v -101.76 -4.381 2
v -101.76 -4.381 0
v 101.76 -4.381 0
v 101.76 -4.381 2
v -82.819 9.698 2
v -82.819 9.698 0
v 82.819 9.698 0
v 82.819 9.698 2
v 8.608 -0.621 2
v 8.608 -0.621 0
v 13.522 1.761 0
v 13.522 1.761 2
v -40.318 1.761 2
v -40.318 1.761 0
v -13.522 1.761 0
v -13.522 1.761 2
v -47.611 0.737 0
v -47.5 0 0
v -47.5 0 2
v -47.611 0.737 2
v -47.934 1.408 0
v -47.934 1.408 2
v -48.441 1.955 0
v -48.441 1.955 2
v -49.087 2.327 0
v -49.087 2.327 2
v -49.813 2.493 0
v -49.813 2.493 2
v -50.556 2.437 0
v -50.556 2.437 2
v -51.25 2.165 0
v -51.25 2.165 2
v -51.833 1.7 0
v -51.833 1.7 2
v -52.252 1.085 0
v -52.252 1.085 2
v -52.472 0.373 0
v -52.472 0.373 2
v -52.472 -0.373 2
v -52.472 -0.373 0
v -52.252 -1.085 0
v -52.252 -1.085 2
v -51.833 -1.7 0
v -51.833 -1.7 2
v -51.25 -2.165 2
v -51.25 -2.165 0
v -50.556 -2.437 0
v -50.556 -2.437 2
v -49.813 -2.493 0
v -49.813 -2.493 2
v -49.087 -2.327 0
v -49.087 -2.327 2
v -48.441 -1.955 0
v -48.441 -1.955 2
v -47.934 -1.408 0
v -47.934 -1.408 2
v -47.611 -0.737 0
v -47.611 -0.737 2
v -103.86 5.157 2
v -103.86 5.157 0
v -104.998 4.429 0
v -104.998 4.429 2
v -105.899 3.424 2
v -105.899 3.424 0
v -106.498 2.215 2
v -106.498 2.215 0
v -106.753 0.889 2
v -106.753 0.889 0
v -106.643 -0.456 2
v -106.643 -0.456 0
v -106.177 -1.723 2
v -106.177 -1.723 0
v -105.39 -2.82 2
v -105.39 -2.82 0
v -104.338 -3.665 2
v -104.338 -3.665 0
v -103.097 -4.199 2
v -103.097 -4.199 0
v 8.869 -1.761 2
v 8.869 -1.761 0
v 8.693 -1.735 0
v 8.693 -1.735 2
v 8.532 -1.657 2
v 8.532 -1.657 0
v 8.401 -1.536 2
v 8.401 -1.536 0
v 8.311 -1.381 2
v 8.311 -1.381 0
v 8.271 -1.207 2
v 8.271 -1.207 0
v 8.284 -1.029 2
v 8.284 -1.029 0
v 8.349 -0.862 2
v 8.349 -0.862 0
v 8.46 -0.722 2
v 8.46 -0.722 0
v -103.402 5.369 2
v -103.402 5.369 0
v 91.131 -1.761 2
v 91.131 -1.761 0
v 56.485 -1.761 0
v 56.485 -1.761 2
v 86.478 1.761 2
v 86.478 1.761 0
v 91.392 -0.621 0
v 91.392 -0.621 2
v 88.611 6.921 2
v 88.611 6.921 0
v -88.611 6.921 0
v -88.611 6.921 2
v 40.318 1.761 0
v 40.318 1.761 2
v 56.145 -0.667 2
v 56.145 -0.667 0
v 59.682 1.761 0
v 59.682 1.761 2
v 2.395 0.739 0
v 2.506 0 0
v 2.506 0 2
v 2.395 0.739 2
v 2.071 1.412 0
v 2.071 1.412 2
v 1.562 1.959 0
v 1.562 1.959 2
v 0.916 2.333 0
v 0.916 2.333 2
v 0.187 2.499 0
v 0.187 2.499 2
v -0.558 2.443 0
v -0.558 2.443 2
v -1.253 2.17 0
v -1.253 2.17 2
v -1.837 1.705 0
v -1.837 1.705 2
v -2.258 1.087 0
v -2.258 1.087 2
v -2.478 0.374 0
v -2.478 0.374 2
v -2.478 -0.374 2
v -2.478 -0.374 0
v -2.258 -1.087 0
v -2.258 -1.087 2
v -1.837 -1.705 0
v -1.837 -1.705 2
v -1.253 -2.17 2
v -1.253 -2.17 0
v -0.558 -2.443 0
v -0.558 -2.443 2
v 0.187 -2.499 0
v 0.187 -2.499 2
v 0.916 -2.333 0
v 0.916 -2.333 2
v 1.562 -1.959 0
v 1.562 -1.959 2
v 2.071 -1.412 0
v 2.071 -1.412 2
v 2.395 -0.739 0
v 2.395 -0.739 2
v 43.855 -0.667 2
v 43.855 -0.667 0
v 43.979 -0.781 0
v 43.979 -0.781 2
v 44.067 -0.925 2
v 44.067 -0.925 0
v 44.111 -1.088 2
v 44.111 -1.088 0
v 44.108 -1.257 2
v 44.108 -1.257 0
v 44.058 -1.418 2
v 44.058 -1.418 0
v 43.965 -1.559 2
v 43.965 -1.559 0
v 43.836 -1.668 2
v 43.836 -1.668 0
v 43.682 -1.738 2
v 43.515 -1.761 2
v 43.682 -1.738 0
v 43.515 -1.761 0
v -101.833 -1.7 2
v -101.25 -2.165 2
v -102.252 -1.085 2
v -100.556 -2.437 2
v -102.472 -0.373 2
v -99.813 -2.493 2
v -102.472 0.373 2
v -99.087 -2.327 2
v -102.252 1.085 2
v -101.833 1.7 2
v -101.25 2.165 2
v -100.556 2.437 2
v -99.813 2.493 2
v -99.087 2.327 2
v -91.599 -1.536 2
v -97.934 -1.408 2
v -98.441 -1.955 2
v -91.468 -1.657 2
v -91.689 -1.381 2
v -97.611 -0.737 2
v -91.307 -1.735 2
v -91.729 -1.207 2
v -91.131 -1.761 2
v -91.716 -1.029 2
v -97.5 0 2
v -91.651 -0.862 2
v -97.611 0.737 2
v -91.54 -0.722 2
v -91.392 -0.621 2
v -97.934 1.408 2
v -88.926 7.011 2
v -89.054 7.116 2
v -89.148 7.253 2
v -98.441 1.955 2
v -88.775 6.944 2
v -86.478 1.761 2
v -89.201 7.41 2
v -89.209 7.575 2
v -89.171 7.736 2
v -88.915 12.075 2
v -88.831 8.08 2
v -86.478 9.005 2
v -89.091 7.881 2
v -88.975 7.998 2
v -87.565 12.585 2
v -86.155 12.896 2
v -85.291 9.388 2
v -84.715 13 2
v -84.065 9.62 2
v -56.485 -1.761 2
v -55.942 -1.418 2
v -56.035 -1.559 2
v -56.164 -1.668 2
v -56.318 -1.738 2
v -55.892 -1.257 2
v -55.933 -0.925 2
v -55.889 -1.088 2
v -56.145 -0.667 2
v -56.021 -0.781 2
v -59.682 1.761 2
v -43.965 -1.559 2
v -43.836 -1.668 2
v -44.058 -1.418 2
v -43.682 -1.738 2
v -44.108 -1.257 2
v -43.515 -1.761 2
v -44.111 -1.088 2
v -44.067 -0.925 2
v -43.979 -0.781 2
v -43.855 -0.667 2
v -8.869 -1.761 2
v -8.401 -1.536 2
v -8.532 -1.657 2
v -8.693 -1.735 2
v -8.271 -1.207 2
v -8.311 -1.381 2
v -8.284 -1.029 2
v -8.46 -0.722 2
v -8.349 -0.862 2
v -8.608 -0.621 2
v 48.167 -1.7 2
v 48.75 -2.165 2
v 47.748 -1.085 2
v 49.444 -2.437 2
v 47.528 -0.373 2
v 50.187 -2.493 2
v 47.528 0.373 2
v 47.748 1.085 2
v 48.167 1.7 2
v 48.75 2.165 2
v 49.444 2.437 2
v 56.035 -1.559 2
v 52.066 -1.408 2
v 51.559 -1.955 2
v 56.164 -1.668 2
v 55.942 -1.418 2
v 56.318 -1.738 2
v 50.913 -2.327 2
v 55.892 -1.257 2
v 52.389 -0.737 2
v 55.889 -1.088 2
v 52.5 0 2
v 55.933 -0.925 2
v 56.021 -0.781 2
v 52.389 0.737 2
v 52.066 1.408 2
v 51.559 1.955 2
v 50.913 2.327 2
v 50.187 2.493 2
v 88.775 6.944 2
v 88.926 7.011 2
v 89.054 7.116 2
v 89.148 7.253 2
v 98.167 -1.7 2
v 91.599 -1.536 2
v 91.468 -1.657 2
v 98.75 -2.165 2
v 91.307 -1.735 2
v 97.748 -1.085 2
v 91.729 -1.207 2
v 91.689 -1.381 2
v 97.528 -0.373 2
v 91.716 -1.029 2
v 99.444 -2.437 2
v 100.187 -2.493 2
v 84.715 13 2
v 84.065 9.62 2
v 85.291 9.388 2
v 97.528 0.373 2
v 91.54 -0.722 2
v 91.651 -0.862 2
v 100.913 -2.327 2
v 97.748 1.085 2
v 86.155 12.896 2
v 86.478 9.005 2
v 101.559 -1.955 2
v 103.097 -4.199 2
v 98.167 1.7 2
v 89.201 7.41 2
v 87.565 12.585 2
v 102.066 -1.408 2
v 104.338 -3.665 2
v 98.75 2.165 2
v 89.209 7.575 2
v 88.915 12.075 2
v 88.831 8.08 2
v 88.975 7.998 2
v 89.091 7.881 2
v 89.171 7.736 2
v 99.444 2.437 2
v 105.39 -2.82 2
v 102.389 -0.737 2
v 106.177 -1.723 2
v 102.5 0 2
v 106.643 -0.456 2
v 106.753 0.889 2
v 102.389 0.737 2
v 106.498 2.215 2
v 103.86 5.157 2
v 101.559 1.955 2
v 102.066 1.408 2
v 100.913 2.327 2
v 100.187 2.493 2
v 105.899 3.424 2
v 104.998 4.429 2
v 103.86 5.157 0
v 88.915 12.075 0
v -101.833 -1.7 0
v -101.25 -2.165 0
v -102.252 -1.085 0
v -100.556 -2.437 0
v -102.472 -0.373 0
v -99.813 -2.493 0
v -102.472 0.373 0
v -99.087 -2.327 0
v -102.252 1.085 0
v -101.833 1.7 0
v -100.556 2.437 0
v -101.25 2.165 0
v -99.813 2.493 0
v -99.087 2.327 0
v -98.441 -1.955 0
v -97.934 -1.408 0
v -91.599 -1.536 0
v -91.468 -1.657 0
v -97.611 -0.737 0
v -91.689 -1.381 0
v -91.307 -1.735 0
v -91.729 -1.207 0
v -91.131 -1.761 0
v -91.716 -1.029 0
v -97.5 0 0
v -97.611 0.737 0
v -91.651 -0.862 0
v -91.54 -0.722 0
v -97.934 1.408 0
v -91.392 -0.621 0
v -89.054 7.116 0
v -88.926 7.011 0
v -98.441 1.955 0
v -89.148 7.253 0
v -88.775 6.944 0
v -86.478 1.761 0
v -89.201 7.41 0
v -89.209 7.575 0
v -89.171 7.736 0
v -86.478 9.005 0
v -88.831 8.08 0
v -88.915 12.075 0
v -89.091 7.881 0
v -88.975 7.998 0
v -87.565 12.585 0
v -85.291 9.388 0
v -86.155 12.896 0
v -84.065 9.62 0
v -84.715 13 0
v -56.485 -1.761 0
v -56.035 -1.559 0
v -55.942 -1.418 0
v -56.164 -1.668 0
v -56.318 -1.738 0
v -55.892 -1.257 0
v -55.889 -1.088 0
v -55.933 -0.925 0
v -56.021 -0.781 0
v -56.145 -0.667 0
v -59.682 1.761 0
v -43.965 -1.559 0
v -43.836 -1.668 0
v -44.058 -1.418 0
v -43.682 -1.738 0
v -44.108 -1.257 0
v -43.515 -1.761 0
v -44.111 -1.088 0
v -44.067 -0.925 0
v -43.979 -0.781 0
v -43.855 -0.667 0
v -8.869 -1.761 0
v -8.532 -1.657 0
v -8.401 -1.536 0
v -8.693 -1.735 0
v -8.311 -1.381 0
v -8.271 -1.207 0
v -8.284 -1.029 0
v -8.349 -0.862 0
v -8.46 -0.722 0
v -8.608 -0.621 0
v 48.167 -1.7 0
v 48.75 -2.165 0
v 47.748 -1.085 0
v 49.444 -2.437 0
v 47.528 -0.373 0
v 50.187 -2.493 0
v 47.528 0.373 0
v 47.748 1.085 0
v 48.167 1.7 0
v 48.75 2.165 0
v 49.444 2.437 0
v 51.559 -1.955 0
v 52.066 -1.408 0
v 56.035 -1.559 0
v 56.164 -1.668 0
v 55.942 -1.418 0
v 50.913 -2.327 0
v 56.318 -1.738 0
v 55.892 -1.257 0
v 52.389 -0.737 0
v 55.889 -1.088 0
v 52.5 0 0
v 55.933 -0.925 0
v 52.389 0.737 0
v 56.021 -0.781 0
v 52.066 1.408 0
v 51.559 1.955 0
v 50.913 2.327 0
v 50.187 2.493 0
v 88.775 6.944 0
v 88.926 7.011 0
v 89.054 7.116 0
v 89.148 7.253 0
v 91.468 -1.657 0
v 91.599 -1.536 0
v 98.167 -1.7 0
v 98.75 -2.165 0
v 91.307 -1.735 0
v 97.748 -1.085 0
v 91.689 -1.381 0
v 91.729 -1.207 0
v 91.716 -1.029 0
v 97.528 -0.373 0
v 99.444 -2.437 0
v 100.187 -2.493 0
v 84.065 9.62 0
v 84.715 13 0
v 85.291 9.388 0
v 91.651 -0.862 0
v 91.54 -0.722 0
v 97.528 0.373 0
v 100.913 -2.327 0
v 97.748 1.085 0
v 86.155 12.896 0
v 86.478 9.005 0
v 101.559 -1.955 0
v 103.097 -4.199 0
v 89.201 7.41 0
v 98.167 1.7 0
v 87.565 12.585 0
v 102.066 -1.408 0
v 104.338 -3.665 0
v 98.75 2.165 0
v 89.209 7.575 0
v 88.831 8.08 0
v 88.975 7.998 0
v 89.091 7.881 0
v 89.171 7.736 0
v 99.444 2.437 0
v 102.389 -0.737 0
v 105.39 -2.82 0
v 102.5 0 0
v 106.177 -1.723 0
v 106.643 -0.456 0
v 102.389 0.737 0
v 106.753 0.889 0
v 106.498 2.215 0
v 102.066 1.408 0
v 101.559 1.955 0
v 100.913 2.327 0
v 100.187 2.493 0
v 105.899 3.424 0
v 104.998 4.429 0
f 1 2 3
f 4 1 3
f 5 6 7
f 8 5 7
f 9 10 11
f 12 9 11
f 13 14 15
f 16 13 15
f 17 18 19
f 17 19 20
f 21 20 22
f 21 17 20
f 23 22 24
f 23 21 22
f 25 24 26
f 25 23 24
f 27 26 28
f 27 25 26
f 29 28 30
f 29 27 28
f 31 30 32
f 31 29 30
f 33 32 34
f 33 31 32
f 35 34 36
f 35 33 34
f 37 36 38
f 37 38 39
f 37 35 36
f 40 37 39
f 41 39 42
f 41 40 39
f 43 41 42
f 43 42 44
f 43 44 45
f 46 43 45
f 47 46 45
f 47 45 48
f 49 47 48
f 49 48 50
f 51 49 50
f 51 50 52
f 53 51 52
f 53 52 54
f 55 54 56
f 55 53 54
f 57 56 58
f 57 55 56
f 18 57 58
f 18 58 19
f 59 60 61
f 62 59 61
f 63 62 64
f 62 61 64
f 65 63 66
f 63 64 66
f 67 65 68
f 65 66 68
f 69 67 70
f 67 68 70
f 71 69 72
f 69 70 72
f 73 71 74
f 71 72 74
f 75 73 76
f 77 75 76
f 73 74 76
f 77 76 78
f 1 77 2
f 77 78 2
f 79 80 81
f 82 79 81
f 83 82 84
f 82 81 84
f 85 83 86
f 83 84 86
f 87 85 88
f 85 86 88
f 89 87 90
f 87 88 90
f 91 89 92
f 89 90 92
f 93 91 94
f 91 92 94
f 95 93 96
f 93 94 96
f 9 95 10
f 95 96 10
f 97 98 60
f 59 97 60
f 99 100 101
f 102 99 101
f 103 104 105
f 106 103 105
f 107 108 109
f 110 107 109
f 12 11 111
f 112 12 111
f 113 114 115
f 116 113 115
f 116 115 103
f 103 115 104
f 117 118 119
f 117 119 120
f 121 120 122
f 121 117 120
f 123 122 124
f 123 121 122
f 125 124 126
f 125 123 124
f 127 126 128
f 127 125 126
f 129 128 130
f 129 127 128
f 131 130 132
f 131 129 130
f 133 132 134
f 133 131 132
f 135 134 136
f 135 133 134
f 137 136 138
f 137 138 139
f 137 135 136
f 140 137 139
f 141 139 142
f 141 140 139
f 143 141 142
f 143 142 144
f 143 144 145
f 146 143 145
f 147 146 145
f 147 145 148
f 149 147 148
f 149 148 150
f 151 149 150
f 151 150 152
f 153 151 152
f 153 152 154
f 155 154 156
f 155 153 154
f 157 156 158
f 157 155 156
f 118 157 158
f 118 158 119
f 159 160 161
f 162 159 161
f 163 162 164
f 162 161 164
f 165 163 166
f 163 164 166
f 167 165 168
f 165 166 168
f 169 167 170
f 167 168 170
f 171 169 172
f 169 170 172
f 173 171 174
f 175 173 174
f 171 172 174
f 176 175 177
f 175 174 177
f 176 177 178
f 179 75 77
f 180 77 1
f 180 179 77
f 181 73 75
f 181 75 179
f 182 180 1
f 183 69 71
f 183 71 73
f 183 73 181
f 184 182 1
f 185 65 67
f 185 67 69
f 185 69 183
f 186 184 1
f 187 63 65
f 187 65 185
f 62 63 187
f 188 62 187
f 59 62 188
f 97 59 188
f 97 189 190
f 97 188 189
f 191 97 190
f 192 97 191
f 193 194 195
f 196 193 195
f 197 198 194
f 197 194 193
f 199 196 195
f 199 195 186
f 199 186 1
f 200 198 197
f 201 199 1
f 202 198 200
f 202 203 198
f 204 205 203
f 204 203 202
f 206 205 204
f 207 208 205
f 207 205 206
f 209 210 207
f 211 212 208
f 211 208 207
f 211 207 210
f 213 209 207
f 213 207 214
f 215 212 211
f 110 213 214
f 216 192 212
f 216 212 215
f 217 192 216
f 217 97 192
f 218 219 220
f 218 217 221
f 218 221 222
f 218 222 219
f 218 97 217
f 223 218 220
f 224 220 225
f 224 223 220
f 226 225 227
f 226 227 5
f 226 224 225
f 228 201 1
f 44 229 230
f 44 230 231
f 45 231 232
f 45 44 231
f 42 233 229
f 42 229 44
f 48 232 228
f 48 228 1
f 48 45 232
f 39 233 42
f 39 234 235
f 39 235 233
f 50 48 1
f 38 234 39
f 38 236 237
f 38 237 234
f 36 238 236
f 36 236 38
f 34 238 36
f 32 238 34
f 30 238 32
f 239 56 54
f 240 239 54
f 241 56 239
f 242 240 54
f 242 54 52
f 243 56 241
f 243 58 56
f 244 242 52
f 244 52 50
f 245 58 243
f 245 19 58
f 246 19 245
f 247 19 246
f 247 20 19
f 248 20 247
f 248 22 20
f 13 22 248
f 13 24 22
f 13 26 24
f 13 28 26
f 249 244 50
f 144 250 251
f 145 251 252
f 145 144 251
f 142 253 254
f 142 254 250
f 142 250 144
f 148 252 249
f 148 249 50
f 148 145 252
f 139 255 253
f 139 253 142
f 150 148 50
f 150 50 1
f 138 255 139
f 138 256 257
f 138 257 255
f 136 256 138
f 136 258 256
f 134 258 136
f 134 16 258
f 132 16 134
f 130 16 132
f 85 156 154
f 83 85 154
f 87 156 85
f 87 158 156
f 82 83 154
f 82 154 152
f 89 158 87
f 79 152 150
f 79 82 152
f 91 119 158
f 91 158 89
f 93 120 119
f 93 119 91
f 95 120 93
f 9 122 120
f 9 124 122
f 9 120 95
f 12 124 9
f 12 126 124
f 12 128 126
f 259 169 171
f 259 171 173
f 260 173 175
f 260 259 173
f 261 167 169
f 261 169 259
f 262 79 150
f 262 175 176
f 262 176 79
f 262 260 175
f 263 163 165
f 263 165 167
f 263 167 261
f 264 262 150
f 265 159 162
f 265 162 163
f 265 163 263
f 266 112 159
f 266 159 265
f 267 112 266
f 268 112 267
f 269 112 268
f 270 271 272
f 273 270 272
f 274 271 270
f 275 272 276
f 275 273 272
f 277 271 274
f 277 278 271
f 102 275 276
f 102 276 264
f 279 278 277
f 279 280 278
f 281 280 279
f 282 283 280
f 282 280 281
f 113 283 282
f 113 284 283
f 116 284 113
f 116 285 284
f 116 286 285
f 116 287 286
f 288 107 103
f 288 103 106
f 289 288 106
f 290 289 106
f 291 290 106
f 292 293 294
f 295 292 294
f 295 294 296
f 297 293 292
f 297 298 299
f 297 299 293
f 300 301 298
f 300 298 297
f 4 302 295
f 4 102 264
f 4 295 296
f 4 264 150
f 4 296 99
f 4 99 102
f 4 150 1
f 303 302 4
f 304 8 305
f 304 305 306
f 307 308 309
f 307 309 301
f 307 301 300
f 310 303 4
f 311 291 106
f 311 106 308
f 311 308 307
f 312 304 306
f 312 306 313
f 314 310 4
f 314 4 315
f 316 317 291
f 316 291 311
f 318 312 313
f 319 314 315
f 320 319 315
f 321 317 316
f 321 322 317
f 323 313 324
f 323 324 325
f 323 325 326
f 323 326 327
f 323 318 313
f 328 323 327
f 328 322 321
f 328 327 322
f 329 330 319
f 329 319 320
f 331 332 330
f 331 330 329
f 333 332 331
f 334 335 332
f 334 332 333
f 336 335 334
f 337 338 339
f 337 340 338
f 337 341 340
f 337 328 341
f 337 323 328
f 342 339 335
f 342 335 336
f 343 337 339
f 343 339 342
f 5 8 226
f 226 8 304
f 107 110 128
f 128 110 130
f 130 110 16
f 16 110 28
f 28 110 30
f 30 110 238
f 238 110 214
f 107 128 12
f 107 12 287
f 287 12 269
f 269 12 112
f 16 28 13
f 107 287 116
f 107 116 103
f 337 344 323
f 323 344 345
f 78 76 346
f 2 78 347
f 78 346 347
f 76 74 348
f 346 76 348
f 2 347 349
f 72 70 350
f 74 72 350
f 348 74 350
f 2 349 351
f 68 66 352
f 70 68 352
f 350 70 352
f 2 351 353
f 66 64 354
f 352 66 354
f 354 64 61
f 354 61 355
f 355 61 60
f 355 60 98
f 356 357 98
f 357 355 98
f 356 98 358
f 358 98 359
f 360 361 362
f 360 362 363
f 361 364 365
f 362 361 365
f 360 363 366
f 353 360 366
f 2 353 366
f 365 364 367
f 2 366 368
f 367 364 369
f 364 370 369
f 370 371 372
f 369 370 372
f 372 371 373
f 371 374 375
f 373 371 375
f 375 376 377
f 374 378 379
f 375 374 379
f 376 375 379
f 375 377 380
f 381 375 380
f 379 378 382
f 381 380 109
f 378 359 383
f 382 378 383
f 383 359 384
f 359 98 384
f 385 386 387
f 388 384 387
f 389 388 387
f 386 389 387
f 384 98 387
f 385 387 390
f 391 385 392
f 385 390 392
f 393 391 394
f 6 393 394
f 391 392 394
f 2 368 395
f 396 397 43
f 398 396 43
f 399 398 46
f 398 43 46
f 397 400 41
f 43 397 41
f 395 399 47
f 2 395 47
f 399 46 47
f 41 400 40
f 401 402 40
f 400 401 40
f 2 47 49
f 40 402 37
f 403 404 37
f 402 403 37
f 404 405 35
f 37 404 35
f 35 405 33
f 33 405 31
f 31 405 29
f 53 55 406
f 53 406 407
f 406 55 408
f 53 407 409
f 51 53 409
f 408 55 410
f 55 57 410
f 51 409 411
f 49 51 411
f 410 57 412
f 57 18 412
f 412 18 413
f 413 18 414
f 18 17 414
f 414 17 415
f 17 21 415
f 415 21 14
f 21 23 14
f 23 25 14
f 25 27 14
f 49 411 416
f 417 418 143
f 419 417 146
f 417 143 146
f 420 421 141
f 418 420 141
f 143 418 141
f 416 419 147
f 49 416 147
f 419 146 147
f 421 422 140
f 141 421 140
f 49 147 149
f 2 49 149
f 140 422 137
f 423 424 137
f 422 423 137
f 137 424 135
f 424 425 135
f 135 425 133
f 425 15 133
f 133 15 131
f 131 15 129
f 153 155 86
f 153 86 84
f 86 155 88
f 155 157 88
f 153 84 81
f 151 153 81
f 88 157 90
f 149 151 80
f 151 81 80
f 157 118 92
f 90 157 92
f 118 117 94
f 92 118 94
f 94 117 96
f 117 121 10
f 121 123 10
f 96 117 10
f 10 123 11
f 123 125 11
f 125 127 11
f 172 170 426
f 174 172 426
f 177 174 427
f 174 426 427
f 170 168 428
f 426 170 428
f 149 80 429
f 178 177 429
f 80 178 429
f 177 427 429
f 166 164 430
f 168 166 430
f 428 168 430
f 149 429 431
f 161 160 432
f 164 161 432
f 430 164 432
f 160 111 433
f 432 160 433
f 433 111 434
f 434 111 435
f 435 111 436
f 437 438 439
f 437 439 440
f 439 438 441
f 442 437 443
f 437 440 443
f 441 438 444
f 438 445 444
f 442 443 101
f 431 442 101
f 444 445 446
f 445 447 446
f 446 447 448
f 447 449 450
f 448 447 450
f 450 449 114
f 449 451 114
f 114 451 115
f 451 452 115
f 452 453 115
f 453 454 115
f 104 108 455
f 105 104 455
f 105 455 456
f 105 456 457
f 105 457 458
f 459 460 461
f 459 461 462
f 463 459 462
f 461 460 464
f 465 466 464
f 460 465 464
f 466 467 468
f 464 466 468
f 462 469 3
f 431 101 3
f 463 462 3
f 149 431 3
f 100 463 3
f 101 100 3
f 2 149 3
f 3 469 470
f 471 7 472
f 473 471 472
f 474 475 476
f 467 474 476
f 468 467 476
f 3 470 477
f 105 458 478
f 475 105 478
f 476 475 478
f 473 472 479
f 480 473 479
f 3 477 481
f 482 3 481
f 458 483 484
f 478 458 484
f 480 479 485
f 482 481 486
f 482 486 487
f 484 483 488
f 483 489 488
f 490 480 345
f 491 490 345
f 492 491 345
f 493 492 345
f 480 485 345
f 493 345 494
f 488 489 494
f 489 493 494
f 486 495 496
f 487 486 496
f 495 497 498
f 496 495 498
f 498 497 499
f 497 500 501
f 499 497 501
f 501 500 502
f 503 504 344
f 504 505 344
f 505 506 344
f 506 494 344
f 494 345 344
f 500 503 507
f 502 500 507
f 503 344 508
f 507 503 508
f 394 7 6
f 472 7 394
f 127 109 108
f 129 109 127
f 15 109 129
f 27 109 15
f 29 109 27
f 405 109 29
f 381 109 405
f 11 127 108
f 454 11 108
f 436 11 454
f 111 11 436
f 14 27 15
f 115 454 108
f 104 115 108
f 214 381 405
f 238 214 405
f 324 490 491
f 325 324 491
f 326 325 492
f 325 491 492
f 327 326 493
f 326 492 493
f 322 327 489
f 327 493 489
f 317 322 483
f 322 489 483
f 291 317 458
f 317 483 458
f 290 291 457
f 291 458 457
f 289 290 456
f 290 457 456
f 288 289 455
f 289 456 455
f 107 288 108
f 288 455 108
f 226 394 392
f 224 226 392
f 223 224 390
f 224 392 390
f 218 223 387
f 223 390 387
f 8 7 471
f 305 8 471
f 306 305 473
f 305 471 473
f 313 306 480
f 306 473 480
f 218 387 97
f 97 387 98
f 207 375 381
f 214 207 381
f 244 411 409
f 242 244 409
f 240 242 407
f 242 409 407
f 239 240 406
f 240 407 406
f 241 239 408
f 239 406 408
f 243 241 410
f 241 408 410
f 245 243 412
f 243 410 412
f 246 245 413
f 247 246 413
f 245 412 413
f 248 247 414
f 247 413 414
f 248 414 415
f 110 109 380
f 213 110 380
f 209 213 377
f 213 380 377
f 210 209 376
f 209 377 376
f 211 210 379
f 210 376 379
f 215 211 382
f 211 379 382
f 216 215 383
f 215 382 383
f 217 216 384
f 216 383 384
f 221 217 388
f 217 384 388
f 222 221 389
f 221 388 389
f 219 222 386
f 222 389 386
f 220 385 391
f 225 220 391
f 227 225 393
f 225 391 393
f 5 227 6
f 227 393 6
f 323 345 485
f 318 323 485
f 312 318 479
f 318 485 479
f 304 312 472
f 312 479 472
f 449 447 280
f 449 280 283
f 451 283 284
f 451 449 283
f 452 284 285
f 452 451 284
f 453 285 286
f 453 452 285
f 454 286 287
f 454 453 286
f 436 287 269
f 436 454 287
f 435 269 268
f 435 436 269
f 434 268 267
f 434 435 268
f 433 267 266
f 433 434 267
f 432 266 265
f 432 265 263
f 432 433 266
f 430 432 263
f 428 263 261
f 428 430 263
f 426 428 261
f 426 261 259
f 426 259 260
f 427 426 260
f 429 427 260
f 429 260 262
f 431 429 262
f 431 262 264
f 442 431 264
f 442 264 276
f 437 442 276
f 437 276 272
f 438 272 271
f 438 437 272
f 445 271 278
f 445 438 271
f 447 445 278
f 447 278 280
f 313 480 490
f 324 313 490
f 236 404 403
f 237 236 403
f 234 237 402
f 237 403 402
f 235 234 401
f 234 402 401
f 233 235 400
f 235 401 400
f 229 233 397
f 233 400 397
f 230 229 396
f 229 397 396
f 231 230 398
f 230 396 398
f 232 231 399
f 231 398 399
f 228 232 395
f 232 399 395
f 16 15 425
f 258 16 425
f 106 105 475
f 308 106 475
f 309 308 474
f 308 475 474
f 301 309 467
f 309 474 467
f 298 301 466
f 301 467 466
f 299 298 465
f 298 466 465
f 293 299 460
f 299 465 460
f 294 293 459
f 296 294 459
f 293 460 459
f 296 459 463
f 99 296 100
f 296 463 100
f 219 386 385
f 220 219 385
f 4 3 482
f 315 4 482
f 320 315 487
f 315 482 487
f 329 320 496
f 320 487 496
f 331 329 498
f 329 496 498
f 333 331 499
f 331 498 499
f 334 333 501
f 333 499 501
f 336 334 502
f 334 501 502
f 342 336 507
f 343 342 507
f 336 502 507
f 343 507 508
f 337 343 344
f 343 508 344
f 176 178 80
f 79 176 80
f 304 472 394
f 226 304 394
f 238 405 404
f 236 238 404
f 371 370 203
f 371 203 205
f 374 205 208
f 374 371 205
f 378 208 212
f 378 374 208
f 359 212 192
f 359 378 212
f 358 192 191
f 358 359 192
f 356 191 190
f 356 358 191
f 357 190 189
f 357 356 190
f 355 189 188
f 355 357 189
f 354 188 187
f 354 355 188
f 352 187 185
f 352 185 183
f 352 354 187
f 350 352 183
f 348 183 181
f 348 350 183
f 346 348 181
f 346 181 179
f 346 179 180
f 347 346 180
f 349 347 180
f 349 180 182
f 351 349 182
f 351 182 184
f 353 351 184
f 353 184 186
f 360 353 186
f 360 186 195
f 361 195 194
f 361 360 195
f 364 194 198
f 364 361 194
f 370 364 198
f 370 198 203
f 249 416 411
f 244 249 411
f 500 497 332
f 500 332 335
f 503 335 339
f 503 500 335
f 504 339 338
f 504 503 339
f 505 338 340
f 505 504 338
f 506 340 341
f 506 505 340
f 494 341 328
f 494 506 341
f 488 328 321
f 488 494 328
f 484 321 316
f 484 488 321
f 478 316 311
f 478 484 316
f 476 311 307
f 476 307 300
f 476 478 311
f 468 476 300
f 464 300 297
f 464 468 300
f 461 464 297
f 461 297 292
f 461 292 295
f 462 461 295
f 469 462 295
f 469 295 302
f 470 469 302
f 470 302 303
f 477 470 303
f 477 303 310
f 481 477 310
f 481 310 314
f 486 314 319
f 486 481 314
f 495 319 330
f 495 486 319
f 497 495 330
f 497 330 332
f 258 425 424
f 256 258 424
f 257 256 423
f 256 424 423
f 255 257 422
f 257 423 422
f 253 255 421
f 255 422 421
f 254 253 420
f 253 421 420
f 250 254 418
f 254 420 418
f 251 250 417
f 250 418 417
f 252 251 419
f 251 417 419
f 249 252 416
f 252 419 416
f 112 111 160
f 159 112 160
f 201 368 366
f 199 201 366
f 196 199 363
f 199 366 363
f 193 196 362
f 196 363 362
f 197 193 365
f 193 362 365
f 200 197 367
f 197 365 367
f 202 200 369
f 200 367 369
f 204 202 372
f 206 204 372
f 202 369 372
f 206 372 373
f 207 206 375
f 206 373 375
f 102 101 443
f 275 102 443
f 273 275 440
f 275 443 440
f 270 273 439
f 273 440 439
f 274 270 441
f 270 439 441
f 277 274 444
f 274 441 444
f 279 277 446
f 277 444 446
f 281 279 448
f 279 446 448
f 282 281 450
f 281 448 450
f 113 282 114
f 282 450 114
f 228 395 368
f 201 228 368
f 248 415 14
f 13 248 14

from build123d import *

# Parameters (mm, degrees)
SKETCH1_R           = 2.5
SKETCH1_R_2         = 2.506016037
BOSS_EXTRUDE1_DEPTH = 2


with BuildPart() as part:
    # Sketch1 → Boss-Extrude1 (new body)
    with BuildSketch(Plane.XY):
        with BuildLine():
            Line((84.714565194, 13), (-84.714565194, 13))
            ThreePointArc((-84.714565194, 13), (-86.865323204, 12.765973581), (-88.915414375, 12.074847997))
            Line((-88.915414375, 12.074847997), (-103.401698361, 5.368984247))
            Line((-103.401698361, 5.368984247), (-103.860380263, 5.156655237))
            ThreePointArc((-103.860380263, 5.156655237), (-106.642942464, -0.456147767), (-101.759955673, -4.380768762))
            Line((-101.759955673, -4.380768762), (101.759955673, -4.380768762))
            ThreePointArc((101.759955673, -4.380768762), (106.642942464, -0.456147767), (103.860380263, 5.156655237))
            Line((103.860380263, 5.156655237), (88.915414375, 12.074847997))
            ThreePointArc((88.915414375, 12.074847997), (86.865323204, 12.765973581), (84.714565194, 13))
        make_face()
        with Locations((-100, 0)):
            Circle(SKETCH1_R, mode=Mode.SUBTRACT)
        with BuildLine():
            Line((-59.681677735, 1.761321711), (-56.14514104, -0.666672148))
            ThreePointArc((-56.14514104, -0.666672148), (-55.911681313, -1.339099386), (-56.484737706, -1.761317581))
            Line((-56.484737706, -1.761317581), (-91.130638371, -1.761317581))
            ThreePointArc((-91.130638371, -1.761317581), (-91.71541475, -1.295617942), (-91.392423967, -0.621439537))
            Line((-91.392423967, -0.621439537), (-86.478477199, 1.761321711))
            Line((-86.478477199, 1.761321711), (-59.681677735, 1.761321711))
        make_face(mode=Mode.SUBTRACT)
        with Locations((-50, 0)):
            Circle(SKETCH1_R, mode=Mode.SUBTRACT)
        with BuildLine():
            Line((-13.521523964, 1.761321711), (-8.607577196, -0.621439537))
            ThreePointArc((-8.607577196, -0.621439537), (-8.284586412, -1.295617942), (-8.869362791, -1.761317581))
            Line((-8.869362791, -1.761317581), (-43.515263456, -1.761317581))
            ThreePointArc((-43.515263456, -1.761317581), (-44.08831985, -1.339099386), (-43.854860123, -0.666672148))
            Line((-43.854860123, -0.666672148), (-40.318323427, 1.761321711))
            Line((-40.318323427, 1.761321711), (-13.521523964, 1.761321711))
        make_face(mode=Mode.SUBTRACT)
        Circle(SKETCH1_R_2, mode=Mode.SUBTRACT)
        with BuildLine():
            Line((40.318323427, 1.761321711), (43.854860123, -0.666672148))
            ThreePointArc((43.854860123, -0.666672148), (44.08831985, -1.339099386), (43.515263456, -1.761317581))
            Line((43.515263456, -1.761317581), (8.869362791, -1.761317581))
            ThreePointArc((8.869362791, -1.761317581), (8.284586412, -1.295617942), (8.607577196, -0.621439537))
            Line((8.607577196, -0.621439537), (13.521523964, 1.761321711))
            Line((13.521523964, 1.761321711), (40.318323427, 1.761321711))
        make_face(mode=Mode.SUBTRACT)
        with Locations((50.000000581, 2.065e-06)):
            Circle(SKETCH1_R, mode=Mode.SUBTRACT)
        with BuildLine():
            Line((86.478477199, 1.761321711), (91.392423967, -0.621439537))
            ThreePointArc((91.392423967, -0.621439537), (91.71541475, -1.295617942), (91.130638371, -1.761317581))
            Line((91.130638371, -1.761317581), (56.484737706, -1.761317581))
            ThreePointArc((56.484737706, -1.761317581), (55.911681313, -1.339099386), (56.14514104, -0.666672148))
            Line((56.14514104, -0.666672148), (59.681677735, 1.761321711))
            Line((59.681677735, 1.761321711), (86.478477199, 1.761321711))
        make_face(mode=Mode.SUBTRACT)
        with Locations((100, 0)):
            Circle(SKETCH1_R, mode=Mode.SUBTRACT)
        with BuildLine():
            ThreePointArc((-86.478477199, 9.004514969), (-84.681411012, 9.523161606), (-82.81919634, 9.698083666))
            Line((-82.81919634, 9.698083666), (82.81919634, 9.698083666))
            ThreePointArc((82.81919634, 9.698083666), (84.681411012, 9.523161606), (86.478477199, 9.004514969))
            Line((86.478477199, 9.004514969), (88.830674001, 8.079633191))
            ThreePointArc((88.830674001, 8.079633191), (89.200621826, 7.409514432), (88.611117149, 6.921247313))
            Line((88.611117149, 6.921247313), (84.714565194, 6.921247313))
            Line((84.714565194, 6.921247313), (-84.714565194, 6.921247313))
            Line((-84.714565194, 6.921247313), (-88.611117149, 6.921247313))
            ThreePointArc((-88.611117149, 6.921247313), (-89.200621826, 7.409514432), (-88.830674001, 8.079633191))
            Line((-88.830674001, 8.079633191), (-86.478477199, 9.004514969))
        make_face(mode=Mode.SUBTRACT)
    extrude(amount=BOSS_EXTRUDE1_DEPTH)


solid = part.part
